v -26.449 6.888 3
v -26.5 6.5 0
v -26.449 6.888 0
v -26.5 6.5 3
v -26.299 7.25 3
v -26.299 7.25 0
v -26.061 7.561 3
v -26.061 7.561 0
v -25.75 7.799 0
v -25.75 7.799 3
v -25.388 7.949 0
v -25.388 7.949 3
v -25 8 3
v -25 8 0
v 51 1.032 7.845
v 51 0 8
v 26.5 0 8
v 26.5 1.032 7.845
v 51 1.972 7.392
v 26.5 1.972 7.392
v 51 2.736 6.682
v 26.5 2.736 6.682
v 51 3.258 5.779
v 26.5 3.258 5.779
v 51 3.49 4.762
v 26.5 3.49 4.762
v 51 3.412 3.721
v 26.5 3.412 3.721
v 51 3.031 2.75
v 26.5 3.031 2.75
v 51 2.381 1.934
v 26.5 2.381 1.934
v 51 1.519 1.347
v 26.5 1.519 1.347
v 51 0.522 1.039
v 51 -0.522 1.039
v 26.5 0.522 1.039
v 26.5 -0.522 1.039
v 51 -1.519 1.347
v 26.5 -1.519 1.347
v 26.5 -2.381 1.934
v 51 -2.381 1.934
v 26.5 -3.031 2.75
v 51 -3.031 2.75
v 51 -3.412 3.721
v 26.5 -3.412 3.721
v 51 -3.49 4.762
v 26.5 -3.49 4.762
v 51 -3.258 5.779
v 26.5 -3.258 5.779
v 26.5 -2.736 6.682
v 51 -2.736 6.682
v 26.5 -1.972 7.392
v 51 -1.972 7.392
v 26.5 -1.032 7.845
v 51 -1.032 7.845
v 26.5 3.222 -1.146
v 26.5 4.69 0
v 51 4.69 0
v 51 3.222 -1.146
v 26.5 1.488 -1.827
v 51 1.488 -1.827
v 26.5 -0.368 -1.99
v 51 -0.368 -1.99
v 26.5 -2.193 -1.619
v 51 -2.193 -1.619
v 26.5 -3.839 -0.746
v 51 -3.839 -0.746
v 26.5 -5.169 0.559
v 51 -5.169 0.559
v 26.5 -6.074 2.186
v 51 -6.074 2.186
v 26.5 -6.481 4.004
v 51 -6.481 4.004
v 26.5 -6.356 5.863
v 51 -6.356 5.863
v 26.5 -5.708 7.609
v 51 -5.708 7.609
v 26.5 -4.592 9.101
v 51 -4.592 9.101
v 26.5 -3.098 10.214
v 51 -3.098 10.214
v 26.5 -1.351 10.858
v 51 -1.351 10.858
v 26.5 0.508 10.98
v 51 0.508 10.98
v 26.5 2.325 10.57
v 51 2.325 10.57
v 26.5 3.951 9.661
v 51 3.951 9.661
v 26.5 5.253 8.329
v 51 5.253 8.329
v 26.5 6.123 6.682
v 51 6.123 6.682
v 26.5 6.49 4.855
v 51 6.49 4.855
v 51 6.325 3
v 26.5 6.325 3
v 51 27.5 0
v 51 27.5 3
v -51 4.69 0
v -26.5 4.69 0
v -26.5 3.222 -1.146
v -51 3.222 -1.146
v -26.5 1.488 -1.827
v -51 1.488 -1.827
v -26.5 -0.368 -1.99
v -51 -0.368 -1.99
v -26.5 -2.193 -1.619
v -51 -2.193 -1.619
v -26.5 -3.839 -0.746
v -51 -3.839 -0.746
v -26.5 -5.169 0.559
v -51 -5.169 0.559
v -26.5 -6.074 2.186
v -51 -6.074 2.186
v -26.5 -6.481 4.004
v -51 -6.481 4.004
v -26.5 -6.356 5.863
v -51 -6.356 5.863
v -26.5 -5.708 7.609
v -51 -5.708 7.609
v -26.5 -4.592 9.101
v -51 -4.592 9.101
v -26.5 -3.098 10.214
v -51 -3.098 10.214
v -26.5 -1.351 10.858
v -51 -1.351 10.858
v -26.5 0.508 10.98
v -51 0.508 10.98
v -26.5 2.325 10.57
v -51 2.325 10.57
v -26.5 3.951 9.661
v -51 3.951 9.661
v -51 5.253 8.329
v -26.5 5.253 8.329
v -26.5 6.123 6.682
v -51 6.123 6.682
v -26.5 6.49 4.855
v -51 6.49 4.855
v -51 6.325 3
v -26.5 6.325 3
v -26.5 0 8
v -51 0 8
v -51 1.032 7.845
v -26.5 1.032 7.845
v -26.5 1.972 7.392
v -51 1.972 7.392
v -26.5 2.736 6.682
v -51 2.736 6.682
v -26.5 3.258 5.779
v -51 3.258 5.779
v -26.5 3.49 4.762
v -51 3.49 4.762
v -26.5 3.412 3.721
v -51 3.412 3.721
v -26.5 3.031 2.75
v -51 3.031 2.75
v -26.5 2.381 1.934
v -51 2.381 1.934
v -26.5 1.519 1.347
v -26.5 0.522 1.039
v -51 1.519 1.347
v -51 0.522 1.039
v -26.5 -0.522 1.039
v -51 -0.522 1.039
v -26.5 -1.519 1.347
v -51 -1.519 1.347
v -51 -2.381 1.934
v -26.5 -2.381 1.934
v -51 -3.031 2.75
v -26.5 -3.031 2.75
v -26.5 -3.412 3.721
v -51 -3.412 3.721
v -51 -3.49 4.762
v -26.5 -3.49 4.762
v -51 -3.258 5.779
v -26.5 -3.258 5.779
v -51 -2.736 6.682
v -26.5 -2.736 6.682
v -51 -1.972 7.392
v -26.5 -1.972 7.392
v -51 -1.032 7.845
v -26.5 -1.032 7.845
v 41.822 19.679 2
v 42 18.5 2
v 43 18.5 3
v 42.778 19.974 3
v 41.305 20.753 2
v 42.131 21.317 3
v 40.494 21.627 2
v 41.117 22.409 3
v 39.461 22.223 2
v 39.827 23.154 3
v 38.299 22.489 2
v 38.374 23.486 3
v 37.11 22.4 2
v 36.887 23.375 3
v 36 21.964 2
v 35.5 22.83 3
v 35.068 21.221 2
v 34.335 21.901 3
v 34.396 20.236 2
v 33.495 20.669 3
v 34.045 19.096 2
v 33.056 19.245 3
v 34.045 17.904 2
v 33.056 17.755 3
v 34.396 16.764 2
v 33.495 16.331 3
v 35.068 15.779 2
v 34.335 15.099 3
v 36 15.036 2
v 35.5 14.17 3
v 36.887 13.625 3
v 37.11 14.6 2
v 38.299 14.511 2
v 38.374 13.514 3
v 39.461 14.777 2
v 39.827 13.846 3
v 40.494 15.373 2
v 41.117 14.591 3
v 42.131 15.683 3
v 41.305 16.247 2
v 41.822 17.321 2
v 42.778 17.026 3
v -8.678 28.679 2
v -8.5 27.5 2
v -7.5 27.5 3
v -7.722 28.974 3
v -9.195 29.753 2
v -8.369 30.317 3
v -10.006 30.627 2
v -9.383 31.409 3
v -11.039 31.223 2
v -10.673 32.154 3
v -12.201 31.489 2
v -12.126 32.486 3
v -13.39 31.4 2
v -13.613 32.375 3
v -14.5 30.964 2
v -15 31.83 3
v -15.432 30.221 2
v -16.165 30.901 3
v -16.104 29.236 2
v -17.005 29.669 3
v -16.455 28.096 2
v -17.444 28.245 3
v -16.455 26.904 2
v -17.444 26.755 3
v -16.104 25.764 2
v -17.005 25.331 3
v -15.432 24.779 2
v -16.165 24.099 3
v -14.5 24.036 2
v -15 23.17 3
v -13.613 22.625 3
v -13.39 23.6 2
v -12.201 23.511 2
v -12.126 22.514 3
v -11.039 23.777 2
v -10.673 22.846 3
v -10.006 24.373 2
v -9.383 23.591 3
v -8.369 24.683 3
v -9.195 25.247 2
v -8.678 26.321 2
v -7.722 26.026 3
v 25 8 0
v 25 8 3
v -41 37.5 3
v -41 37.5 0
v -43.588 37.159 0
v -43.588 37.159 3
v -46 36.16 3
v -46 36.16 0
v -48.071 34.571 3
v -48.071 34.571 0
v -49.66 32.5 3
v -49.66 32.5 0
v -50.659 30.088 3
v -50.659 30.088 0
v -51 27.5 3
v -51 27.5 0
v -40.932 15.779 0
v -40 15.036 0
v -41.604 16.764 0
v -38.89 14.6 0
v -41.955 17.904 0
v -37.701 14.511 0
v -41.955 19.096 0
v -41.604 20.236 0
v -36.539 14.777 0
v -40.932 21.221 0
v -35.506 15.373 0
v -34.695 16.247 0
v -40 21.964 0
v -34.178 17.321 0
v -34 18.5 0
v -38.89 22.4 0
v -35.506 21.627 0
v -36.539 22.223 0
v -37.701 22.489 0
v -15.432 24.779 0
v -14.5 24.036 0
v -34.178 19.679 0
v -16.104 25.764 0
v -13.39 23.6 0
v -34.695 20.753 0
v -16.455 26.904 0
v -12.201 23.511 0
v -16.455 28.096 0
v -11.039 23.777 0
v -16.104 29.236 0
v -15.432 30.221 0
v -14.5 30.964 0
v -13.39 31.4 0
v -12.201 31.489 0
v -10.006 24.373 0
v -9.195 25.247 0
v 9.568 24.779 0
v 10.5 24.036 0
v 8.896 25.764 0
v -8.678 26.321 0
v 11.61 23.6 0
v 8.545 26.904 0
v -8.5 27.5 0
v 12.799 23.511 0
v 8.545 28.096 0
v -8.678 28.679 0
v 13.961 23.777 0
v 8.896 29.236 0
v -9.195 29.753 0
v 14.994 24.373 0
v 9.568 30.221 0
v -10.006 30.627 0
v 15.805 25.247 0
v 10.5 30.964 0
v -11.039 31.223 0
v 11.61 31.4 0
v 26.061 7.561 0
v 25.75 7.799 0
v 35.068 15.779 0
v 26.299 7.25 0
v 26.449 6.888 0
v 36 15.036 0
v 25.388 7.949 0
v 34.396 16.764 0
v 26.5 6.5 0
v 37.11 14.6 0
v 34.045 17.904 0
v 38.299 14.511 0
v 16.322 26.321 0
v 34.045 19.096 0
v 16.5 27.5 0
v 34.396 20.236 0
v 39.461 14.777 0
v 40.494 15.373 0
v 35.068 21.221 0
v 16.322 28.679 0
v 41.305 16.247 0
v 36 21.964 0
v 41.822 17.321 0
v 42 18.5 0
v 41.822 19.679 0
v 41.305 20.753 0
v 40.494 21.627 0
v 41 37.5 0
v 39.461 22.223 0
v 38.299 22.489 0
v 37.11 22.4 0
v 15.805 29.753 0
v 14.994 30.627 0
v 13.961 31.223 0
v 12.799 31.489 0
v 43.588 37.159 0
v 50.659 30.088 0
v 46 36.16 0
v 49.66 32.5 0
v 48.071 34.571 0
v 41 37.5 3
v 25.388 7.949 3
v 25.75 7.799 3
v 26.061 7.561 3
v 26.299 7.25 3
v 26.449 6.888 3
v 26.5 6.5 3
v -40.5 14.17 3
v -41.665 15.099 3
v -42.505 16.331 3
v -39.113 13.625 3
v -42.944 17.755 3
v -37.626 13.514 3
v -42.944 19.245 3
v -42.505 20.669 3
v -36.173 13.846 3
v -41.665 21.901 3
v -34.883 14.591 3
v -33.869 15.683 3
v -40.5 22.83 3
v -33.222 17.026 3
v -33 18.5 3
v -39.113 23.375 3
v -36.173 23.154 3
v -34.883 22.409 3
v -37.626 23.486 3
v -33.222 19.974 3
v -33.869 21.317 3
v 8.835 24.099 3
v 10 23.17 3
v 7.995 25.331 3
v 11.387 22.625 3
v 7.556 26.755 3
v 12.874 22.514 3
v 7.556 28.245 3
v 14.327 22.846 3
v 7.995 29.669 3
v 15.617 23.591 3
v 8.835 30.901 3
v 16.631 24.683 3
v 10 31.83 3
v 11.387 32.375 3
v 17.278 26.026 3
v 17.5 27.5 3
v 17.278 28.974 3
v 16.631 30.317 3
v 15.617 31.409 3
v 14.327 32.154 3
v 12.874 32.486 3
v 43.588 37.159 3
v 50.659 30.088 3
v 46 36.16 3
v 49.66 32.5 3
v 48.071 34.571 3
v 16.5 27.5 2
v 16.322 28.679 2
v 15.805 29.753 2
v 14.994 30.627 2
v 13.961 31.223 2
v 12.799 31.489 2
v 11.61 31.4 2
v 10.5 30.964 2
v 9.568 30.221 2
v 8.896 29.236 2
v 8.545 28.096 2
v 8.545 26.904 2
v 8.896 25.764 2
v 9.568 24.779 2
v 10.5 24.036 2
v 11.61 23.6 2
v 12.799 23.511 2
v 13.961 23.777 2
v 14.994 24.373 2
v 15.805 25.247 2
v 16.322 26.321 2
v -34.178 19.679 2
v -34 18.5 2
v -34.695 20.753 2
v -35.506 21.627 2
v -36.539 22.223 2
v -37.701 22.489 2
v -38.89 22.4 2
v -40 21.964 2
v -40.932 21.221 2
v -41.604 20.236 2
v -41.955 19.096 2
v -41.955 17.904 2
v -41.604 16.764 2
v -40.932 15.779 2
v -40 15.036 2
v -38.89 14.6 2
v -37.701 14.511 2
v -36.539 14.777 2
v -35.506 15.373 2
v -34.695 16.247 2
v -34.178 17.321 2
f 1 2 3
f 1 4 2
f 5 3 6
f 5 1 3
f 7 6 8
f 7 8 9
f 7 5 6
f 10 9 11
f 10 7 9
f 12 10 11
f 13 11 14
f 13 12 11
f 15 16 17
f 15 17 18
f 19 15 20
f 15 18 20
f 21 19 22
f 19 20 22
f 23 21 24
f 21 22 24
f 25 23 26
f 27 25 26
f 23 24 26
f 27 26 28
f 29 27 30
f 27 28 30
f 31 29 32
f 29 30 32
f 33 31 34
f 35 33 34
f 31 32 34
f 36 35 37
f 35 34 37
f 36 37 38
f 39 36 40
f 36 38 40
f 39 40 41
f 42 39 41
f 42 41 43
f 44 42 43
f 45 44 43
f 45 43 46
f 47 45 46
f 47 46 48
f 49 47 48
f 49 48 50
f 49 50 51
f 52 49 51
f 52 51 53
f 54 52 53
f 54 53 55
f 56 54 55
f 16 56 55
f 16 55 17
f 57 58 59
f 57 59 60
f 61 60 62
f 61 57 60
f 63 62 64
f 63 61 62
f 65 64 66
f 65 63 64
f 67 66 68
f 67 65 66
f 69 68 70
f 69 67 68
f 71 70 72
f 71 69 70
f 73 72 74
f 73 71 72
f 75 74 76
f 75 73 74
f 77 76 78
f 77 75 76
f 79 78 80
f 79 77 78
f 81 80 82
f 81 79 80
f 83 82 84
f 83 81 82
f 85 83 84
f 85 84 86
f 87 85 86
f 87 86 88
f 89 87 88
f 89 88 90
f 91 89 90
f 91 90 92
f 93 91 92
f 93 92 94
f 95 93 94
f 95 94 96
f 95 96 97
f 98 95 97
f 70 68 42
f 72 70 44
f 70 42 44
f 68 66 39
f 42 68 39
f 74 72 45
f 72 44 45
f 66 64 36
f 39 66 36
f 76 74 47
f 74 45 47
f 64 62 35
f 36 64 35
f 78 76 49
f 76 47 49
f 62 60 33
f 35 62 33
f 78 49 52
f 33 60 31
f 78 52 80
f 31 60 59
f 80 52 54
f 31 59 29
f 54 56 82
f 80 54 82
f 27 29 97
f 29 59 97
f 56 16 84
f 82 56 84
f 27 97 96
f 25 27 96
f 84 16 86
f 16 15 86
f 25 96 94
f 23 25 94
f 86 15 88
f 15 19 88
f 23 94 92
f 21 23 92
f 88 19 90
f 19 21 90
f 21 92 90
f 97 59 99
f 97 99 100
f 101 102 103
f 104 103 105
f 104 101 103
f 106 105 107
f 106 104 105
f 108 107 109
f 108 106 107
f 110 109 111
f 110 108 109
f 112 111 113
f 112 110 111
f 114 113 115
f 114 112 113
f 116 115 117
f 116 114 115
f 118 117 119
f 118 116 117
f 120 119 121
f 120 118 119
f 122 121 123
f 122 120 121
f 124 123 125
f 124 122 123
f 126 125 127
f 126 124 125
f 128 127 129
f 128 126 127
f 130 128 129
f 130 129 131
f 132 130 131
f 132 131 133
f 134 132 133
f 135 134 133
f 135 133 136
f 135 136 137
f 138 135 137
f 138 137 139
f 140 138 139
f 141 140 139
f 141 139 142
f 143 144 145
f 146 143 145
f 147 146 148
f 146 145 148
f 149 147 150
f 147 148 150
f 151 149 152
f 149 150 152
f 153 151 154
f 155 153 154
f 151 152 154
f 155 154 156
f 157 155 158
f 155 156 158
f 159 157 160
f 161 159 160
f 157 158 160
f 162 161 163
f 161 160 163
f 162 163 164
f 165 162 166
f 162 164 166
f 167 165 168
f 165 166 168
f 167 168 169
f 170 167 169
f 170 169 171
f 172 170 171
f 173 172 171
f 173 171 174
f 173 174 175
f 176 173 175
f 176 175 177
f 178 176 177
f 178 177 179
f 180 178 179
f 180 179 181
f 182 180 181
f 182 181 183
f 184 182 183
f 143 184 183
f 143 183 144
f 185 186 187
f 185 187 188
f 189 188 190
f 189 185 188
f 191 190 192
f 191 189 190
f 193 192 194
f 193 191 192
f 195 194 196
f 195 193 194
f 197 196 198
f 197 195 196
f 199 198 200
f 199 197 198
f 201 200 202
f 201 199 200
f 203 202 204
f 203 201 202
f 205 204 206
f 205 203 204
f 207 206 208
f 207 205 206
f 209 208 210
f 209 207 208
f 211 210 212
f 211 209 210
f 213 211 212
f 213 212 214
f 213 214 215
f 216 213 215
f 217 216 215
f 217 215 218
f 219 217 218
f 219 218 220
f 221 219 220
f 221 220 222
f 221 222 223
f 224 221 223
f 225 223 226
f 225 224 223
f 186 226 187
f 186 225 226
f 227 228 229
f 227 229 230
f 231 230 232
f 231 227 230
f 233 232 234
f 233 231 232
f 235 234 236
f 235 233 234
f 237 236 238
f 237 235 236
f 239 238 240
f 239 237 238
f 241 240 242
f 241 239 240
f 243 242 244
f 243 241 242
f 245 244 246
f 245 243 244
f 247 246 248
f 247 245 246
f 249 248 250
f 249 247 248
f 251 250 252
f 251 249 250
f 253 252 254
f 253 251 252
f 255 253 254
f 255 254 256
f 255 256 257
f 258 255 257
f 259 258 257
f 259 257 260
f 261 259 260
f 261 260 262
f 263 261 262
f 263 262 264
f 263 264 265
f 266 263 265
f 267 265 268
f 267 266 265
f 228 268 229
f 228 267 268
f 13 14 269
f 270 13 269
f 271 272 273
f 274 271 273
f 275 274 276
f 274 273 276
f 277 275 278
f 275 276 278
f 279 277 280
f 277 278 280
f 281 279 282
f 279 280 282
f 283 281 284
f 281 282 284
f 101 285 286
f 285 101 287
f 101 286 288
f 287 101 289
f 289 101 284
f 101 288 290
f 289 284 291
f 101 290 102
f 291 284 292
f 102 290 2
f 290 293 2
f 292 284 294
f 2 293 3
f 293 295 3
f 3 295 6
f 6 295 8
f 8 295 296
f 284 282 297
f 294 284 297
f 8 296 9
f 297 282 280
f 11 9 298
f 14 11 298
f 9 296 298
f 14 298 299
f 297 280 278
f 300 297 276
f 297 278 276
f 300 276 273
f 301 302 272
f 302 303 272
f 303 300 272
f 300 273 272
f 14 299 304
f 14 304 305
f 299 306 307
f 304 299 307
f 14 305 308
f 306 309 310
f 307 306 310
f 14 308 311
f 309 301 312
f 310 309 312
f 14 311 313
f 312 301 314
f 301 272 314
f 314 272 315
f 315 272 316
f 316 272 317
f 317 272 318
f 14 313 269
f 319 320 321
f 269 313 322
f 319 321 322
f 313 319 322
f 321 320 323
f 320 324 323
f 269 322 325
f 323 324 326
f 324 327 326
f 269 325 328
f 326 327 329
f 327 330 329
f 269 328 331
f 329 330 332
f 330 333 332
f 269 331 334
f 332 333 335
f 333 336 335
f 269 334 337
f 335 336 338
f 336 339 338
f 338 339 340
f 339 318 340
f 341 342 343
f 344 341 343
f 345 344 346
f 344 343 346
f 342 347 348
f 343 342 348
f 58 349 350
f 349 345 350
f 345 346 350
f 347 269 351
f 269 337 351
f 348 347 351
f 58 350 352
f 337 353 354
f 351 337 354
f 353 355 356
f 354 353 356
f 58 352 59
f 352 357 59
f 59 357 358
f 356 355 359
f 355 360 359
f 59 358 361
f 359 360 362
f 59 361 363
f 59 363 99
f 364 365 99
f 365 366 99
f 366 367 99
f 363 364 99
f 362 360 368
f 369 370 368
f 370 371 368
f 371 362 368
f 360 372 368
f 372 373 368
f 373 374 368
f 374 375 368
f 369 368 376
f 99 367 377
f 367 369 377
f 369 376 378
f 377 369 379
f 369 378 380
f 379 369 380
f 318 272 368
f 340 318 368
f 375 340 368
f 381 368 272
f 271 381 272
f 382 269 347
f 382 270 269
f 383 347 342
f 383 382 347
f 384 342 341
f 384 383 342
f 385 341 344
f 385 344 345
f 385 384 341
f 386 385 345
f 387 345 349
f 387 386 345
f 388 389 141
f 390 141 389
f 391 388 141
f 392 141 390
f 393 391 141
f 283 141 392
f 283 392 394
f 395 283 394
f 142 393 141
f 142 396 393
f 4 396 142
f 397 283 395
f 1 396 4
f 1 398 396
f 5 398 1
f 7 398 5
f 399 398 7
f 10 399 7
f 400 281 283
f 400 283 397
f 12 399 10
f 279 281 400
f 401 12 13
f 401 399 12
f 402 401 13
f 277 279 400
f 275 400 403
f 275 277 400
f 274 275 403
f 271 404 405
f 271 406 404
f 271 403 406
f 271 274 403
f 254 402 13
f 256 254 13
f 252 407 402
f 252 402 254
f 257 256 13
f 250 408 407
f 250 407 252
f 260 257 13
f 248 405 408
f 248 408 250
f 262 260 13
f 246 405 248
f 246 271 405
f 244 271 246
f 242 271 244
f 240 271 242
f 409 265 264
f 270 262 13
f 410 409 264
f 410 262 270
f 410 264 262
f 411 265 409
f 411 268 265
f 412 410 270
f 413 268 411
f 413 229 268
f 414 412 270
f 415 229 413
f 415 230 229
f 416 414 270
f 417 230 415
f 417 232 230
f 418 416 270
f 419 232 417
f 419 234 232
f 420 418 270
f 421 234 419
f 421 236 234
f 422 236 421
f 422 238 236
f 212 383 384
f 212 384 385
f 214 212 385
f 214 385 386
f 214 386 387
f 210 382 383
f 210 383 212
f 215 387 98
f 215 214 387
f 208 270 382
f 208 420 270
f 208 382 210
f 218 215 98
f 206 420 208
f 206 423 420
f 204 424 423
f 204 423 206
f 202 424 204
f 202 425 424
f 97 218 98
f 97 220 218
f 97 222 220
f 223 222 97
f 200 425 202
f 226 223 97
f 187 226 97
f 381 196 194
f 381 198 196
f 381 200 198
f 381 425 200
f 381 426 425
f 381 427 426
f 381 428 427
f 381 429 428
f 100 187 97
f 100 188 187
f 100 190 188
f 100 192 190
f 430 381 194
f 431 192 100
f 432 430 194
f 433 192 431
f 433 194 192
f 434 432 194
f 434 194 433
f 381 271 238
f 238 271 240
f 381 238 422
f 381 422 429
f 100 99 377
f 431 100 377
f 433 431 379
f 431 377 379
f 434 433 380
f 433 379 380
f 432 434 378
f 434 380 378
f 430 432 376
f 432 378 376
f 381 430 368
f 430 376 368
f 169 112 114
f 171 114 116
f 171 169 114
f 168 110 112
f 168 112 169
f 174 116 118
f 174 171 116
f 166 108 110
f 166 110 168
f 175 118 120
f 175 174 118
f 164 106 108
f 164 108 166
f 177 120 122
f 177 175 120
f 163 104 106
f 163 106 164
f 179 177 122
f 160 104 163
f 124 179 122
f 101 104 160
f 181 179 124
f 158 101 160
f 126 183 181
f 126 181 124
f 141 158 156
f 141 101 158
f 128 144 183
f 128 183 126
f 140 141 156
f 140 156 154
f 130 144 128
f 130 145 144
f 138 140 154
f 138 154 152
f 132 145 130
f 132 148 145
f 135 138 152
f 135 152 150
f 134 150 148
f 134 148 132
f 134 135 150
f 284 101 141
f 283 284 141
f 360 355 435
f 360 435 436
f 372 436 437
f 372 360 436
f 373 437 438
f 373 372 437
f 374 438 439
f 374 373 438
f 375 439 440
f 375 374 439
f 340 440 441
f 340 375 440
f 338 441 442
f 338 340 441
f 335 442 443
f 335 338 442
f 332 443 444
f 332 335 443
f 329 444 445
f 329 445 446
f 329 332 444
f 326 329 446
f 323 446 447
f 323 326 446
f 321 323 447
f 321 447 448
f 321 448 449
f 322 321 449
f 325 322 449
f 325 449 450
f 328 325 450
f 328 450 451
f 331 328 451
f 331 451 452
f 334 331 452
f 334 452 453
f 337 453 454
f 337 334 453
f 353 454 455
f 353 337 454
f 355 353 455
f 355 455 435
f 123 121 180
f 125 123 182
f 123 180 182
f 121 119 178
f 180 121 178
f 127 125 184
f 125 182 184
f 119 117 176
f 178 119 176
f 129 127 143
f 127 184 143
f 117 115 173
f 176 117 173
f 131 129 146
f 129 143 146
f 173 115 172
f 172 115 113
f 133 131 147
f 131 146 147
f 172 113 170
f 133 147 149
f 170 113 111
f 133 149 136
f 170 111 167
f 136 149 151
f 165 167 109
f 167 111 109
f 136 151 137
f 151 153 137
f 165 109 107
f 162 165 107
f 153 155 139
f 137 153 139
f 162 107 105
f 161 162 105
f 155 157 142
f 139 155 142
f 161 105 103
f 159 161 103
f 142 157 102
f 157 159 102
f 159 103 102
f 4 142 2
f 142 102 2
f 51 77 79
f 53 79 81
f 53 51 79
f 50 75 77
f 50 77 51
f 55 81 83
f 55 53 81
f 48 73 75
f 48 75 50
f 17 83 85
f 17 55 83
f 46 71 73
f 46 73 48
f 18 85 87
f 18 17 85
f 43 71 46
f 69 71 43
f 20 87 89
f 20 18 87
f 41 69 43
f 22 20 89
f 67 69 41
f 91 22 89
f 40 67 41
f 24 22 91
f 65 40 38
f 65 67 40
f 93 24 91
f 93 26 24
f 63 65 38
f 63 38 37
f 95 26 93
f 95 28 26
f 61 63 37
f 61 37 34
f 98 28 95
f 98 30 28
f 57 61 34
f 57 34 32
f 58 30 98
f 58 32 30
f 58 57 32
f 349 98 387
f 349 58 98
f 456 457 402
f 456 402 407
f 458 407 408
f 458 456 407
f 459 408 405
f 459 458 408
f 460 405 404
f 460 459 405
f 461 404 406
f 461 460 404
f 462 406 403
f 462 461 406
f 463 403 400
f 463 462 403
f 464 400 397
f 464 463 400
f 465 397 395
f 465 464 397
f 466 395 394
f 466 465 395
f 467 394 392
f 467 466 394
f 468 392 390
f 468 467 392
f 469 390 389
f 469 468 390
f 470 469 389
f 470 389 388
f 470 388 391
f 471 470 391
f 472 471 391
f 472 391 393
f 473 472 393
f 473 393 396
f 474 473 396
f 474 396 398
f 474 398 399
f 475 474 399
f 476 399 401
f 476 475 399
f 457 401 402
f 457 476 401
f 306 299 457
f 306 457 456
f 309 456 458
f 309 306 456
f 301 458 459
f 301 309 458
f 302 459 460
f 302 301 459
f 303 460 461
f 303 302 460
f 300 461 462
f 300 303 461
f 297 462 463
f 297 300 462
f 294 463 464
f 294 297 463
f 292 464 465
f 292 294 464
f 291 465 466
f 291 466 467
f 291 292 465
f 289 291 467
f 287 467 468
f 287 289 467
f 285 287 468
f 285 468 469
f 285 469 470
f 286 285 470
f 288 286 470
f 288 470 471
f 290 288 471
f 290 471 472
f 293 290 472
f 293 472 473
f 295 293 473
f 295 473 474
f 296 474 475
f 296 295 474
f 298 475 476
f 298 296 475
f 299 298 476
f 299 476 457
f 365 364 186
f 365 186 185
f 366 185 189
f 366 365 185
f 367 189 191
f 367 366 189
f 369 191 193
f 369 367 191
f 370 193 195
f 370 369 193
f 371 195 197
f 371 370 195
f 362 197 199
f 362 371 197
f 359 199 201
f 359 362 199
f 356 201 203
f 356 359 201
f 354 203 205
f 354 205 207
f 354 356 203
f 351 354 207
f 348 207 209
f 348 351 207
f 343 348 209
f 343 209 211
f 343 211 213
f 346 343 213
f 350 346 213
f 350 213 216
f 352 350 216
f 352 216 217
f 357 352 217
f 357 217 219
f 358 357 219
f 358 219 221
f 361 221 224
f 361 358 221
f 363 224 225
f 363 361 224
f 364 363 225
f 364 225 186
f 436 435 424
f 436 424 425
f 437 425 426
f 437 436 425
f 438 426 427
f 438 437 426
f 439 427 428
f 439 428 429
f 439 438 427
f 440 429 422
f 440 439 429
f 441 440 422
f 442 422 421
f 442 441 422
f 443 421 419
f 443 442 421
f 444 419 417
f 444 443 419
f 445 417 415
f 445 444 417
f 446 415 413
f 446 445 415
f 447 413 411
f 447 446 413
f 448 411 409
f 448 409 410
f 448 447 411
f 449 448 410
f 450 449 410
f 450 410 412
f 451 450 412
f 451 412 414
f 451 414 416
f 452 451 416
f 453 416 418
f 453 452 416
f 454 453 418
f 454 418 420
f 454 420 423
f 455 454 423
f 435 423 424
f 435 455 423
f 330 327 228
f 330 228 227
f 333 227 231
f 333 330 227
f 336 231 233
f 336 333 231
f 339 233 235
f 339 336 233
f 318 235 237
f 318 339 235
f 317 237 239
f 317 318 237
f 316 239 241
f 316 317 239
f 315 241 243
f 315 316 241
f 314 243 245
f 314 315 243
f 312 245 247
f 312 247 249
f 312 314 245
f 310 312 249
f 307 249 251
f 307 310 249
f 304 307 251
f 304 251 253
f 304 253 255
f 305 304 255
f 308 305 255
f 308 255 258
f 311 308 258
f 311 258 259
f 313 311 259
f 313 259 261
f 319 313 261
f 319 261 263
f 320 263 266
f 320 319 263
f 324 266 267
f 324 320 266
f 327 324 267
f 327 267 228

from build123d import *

# Parameters (mm, degrees)
SKETCH1_R               = 4
BOSS_EXTRUDE1_DEPTH     = 3
SKETCH2_R               = 6.5
BOSS_EXTRUDE2_DEPTH     = 102
SKETCH3_R               = 3.5
CUT_EXTRUDE1_DEPTH      = 110.230261375
CUT_EXTRUDE2_DEPTH      = 64.806347647
CUT_EXTRUDE2_DEPTH_BACK = 64.806347647
SKETCH4_W               = 53
SKETCH4_H               = 14.5
FILLET1_R               = 1.5
CHAMFER1_SIZE           = 1


with BuildPart() as part:
    # Sketch1 → Boss-Extrude1 (new body)
    with BuildSketch(Plane.XY):
        with BuildLine():
            Line((-51, 0), (51, 0))
            Line((51, 0), (51, 27.5))
            ThreePointArc((51, 27.5), (48.071067812, 34.571067812), (41, 37.5))
            Line((41, 37.5), (-41, 37.5))
            ThreePointArc((-41, 37.5), (-48.071067812, 34.571067812), (-51, 27.5))
            Line((-51, 27.5), (-51, 0))
        make_face()
        with Locations((-38, 18.5)):
            Circle(SKETCH1_R, mode=Mode.SUBTRACT)
        with Locations((38, 18.5)):
            Circle(SKETCH1_R, mode=Mode.SUBTRACT)
        with Locations((-12.5, 27.5)):
            Circle(SKETCH1_R, mode=Mode.SUBTRACT)
        with Locations((12.5, 27.5)):
            Circle(SKETCH1_R, mode=Mode.SUBTRACT)
    extrude(amount=BOSS_EXTRUDE1_DEPTH)

    # Sketch2 → Boss-Extrude2 (add)
    with BuildSketch(Plane.ZY.offset(51)):
        with Locations((4.5, 0)):
            Circle(SKETCH2_R)
    extrude(amount=-BOSS_EXTRUDE2_DEPTH)

    # Sketch3 → Cut-Extrude1 (cut, through all)
    with BuildSketch(Plane.ZY.offset(51)):
        with Locations((4.5, 0)):
            Circle(SKETCH3_R)
    extrude(amount=-CUT_EXTRUDE1_DEPTH, mode=Mode.SUBTRACT)

    # Sketch4 → Cut-Extrude2 (cut, two sides: drawn at the far end of the back side and taken through both)
    with BuildSketch(Plane.XY.offset(3).offset(-CUT_EXTRUDE2_DEPTH_BACK)):
        with Locations((0, 0.75)):
            Rectangle(SKETCH4_W, SKETCH4_H)
    extrude(amount=CUT_EXTRUDE2_DEPTH + CUT_EXTRUDE2_DEPTH_BACK, mode=Mode.SUBTRACT)

    # Fillet1
    fillet1_edges = [part.edges().sort_by_distance(p)[0] for p in [
        (-26.5, 8, 1.5),
        (26.5, 8, 1.5),
    ]]
    fillet(fillet1_edges, radius=FILLET1_R)

    # Chamfer1
    chamfer1_edges = [part.edges().sort_by_distance(p)[0] for p in [
        (-42, 18.5, 3),
        (34, 18.5, 3),
        (-16.5, 27.5, 3),
        (8.5, 27.5, 3),
    ]]
    chamfer(chamfer1_edges, length=CHAMFER1_SIZE)


solid = part.part
